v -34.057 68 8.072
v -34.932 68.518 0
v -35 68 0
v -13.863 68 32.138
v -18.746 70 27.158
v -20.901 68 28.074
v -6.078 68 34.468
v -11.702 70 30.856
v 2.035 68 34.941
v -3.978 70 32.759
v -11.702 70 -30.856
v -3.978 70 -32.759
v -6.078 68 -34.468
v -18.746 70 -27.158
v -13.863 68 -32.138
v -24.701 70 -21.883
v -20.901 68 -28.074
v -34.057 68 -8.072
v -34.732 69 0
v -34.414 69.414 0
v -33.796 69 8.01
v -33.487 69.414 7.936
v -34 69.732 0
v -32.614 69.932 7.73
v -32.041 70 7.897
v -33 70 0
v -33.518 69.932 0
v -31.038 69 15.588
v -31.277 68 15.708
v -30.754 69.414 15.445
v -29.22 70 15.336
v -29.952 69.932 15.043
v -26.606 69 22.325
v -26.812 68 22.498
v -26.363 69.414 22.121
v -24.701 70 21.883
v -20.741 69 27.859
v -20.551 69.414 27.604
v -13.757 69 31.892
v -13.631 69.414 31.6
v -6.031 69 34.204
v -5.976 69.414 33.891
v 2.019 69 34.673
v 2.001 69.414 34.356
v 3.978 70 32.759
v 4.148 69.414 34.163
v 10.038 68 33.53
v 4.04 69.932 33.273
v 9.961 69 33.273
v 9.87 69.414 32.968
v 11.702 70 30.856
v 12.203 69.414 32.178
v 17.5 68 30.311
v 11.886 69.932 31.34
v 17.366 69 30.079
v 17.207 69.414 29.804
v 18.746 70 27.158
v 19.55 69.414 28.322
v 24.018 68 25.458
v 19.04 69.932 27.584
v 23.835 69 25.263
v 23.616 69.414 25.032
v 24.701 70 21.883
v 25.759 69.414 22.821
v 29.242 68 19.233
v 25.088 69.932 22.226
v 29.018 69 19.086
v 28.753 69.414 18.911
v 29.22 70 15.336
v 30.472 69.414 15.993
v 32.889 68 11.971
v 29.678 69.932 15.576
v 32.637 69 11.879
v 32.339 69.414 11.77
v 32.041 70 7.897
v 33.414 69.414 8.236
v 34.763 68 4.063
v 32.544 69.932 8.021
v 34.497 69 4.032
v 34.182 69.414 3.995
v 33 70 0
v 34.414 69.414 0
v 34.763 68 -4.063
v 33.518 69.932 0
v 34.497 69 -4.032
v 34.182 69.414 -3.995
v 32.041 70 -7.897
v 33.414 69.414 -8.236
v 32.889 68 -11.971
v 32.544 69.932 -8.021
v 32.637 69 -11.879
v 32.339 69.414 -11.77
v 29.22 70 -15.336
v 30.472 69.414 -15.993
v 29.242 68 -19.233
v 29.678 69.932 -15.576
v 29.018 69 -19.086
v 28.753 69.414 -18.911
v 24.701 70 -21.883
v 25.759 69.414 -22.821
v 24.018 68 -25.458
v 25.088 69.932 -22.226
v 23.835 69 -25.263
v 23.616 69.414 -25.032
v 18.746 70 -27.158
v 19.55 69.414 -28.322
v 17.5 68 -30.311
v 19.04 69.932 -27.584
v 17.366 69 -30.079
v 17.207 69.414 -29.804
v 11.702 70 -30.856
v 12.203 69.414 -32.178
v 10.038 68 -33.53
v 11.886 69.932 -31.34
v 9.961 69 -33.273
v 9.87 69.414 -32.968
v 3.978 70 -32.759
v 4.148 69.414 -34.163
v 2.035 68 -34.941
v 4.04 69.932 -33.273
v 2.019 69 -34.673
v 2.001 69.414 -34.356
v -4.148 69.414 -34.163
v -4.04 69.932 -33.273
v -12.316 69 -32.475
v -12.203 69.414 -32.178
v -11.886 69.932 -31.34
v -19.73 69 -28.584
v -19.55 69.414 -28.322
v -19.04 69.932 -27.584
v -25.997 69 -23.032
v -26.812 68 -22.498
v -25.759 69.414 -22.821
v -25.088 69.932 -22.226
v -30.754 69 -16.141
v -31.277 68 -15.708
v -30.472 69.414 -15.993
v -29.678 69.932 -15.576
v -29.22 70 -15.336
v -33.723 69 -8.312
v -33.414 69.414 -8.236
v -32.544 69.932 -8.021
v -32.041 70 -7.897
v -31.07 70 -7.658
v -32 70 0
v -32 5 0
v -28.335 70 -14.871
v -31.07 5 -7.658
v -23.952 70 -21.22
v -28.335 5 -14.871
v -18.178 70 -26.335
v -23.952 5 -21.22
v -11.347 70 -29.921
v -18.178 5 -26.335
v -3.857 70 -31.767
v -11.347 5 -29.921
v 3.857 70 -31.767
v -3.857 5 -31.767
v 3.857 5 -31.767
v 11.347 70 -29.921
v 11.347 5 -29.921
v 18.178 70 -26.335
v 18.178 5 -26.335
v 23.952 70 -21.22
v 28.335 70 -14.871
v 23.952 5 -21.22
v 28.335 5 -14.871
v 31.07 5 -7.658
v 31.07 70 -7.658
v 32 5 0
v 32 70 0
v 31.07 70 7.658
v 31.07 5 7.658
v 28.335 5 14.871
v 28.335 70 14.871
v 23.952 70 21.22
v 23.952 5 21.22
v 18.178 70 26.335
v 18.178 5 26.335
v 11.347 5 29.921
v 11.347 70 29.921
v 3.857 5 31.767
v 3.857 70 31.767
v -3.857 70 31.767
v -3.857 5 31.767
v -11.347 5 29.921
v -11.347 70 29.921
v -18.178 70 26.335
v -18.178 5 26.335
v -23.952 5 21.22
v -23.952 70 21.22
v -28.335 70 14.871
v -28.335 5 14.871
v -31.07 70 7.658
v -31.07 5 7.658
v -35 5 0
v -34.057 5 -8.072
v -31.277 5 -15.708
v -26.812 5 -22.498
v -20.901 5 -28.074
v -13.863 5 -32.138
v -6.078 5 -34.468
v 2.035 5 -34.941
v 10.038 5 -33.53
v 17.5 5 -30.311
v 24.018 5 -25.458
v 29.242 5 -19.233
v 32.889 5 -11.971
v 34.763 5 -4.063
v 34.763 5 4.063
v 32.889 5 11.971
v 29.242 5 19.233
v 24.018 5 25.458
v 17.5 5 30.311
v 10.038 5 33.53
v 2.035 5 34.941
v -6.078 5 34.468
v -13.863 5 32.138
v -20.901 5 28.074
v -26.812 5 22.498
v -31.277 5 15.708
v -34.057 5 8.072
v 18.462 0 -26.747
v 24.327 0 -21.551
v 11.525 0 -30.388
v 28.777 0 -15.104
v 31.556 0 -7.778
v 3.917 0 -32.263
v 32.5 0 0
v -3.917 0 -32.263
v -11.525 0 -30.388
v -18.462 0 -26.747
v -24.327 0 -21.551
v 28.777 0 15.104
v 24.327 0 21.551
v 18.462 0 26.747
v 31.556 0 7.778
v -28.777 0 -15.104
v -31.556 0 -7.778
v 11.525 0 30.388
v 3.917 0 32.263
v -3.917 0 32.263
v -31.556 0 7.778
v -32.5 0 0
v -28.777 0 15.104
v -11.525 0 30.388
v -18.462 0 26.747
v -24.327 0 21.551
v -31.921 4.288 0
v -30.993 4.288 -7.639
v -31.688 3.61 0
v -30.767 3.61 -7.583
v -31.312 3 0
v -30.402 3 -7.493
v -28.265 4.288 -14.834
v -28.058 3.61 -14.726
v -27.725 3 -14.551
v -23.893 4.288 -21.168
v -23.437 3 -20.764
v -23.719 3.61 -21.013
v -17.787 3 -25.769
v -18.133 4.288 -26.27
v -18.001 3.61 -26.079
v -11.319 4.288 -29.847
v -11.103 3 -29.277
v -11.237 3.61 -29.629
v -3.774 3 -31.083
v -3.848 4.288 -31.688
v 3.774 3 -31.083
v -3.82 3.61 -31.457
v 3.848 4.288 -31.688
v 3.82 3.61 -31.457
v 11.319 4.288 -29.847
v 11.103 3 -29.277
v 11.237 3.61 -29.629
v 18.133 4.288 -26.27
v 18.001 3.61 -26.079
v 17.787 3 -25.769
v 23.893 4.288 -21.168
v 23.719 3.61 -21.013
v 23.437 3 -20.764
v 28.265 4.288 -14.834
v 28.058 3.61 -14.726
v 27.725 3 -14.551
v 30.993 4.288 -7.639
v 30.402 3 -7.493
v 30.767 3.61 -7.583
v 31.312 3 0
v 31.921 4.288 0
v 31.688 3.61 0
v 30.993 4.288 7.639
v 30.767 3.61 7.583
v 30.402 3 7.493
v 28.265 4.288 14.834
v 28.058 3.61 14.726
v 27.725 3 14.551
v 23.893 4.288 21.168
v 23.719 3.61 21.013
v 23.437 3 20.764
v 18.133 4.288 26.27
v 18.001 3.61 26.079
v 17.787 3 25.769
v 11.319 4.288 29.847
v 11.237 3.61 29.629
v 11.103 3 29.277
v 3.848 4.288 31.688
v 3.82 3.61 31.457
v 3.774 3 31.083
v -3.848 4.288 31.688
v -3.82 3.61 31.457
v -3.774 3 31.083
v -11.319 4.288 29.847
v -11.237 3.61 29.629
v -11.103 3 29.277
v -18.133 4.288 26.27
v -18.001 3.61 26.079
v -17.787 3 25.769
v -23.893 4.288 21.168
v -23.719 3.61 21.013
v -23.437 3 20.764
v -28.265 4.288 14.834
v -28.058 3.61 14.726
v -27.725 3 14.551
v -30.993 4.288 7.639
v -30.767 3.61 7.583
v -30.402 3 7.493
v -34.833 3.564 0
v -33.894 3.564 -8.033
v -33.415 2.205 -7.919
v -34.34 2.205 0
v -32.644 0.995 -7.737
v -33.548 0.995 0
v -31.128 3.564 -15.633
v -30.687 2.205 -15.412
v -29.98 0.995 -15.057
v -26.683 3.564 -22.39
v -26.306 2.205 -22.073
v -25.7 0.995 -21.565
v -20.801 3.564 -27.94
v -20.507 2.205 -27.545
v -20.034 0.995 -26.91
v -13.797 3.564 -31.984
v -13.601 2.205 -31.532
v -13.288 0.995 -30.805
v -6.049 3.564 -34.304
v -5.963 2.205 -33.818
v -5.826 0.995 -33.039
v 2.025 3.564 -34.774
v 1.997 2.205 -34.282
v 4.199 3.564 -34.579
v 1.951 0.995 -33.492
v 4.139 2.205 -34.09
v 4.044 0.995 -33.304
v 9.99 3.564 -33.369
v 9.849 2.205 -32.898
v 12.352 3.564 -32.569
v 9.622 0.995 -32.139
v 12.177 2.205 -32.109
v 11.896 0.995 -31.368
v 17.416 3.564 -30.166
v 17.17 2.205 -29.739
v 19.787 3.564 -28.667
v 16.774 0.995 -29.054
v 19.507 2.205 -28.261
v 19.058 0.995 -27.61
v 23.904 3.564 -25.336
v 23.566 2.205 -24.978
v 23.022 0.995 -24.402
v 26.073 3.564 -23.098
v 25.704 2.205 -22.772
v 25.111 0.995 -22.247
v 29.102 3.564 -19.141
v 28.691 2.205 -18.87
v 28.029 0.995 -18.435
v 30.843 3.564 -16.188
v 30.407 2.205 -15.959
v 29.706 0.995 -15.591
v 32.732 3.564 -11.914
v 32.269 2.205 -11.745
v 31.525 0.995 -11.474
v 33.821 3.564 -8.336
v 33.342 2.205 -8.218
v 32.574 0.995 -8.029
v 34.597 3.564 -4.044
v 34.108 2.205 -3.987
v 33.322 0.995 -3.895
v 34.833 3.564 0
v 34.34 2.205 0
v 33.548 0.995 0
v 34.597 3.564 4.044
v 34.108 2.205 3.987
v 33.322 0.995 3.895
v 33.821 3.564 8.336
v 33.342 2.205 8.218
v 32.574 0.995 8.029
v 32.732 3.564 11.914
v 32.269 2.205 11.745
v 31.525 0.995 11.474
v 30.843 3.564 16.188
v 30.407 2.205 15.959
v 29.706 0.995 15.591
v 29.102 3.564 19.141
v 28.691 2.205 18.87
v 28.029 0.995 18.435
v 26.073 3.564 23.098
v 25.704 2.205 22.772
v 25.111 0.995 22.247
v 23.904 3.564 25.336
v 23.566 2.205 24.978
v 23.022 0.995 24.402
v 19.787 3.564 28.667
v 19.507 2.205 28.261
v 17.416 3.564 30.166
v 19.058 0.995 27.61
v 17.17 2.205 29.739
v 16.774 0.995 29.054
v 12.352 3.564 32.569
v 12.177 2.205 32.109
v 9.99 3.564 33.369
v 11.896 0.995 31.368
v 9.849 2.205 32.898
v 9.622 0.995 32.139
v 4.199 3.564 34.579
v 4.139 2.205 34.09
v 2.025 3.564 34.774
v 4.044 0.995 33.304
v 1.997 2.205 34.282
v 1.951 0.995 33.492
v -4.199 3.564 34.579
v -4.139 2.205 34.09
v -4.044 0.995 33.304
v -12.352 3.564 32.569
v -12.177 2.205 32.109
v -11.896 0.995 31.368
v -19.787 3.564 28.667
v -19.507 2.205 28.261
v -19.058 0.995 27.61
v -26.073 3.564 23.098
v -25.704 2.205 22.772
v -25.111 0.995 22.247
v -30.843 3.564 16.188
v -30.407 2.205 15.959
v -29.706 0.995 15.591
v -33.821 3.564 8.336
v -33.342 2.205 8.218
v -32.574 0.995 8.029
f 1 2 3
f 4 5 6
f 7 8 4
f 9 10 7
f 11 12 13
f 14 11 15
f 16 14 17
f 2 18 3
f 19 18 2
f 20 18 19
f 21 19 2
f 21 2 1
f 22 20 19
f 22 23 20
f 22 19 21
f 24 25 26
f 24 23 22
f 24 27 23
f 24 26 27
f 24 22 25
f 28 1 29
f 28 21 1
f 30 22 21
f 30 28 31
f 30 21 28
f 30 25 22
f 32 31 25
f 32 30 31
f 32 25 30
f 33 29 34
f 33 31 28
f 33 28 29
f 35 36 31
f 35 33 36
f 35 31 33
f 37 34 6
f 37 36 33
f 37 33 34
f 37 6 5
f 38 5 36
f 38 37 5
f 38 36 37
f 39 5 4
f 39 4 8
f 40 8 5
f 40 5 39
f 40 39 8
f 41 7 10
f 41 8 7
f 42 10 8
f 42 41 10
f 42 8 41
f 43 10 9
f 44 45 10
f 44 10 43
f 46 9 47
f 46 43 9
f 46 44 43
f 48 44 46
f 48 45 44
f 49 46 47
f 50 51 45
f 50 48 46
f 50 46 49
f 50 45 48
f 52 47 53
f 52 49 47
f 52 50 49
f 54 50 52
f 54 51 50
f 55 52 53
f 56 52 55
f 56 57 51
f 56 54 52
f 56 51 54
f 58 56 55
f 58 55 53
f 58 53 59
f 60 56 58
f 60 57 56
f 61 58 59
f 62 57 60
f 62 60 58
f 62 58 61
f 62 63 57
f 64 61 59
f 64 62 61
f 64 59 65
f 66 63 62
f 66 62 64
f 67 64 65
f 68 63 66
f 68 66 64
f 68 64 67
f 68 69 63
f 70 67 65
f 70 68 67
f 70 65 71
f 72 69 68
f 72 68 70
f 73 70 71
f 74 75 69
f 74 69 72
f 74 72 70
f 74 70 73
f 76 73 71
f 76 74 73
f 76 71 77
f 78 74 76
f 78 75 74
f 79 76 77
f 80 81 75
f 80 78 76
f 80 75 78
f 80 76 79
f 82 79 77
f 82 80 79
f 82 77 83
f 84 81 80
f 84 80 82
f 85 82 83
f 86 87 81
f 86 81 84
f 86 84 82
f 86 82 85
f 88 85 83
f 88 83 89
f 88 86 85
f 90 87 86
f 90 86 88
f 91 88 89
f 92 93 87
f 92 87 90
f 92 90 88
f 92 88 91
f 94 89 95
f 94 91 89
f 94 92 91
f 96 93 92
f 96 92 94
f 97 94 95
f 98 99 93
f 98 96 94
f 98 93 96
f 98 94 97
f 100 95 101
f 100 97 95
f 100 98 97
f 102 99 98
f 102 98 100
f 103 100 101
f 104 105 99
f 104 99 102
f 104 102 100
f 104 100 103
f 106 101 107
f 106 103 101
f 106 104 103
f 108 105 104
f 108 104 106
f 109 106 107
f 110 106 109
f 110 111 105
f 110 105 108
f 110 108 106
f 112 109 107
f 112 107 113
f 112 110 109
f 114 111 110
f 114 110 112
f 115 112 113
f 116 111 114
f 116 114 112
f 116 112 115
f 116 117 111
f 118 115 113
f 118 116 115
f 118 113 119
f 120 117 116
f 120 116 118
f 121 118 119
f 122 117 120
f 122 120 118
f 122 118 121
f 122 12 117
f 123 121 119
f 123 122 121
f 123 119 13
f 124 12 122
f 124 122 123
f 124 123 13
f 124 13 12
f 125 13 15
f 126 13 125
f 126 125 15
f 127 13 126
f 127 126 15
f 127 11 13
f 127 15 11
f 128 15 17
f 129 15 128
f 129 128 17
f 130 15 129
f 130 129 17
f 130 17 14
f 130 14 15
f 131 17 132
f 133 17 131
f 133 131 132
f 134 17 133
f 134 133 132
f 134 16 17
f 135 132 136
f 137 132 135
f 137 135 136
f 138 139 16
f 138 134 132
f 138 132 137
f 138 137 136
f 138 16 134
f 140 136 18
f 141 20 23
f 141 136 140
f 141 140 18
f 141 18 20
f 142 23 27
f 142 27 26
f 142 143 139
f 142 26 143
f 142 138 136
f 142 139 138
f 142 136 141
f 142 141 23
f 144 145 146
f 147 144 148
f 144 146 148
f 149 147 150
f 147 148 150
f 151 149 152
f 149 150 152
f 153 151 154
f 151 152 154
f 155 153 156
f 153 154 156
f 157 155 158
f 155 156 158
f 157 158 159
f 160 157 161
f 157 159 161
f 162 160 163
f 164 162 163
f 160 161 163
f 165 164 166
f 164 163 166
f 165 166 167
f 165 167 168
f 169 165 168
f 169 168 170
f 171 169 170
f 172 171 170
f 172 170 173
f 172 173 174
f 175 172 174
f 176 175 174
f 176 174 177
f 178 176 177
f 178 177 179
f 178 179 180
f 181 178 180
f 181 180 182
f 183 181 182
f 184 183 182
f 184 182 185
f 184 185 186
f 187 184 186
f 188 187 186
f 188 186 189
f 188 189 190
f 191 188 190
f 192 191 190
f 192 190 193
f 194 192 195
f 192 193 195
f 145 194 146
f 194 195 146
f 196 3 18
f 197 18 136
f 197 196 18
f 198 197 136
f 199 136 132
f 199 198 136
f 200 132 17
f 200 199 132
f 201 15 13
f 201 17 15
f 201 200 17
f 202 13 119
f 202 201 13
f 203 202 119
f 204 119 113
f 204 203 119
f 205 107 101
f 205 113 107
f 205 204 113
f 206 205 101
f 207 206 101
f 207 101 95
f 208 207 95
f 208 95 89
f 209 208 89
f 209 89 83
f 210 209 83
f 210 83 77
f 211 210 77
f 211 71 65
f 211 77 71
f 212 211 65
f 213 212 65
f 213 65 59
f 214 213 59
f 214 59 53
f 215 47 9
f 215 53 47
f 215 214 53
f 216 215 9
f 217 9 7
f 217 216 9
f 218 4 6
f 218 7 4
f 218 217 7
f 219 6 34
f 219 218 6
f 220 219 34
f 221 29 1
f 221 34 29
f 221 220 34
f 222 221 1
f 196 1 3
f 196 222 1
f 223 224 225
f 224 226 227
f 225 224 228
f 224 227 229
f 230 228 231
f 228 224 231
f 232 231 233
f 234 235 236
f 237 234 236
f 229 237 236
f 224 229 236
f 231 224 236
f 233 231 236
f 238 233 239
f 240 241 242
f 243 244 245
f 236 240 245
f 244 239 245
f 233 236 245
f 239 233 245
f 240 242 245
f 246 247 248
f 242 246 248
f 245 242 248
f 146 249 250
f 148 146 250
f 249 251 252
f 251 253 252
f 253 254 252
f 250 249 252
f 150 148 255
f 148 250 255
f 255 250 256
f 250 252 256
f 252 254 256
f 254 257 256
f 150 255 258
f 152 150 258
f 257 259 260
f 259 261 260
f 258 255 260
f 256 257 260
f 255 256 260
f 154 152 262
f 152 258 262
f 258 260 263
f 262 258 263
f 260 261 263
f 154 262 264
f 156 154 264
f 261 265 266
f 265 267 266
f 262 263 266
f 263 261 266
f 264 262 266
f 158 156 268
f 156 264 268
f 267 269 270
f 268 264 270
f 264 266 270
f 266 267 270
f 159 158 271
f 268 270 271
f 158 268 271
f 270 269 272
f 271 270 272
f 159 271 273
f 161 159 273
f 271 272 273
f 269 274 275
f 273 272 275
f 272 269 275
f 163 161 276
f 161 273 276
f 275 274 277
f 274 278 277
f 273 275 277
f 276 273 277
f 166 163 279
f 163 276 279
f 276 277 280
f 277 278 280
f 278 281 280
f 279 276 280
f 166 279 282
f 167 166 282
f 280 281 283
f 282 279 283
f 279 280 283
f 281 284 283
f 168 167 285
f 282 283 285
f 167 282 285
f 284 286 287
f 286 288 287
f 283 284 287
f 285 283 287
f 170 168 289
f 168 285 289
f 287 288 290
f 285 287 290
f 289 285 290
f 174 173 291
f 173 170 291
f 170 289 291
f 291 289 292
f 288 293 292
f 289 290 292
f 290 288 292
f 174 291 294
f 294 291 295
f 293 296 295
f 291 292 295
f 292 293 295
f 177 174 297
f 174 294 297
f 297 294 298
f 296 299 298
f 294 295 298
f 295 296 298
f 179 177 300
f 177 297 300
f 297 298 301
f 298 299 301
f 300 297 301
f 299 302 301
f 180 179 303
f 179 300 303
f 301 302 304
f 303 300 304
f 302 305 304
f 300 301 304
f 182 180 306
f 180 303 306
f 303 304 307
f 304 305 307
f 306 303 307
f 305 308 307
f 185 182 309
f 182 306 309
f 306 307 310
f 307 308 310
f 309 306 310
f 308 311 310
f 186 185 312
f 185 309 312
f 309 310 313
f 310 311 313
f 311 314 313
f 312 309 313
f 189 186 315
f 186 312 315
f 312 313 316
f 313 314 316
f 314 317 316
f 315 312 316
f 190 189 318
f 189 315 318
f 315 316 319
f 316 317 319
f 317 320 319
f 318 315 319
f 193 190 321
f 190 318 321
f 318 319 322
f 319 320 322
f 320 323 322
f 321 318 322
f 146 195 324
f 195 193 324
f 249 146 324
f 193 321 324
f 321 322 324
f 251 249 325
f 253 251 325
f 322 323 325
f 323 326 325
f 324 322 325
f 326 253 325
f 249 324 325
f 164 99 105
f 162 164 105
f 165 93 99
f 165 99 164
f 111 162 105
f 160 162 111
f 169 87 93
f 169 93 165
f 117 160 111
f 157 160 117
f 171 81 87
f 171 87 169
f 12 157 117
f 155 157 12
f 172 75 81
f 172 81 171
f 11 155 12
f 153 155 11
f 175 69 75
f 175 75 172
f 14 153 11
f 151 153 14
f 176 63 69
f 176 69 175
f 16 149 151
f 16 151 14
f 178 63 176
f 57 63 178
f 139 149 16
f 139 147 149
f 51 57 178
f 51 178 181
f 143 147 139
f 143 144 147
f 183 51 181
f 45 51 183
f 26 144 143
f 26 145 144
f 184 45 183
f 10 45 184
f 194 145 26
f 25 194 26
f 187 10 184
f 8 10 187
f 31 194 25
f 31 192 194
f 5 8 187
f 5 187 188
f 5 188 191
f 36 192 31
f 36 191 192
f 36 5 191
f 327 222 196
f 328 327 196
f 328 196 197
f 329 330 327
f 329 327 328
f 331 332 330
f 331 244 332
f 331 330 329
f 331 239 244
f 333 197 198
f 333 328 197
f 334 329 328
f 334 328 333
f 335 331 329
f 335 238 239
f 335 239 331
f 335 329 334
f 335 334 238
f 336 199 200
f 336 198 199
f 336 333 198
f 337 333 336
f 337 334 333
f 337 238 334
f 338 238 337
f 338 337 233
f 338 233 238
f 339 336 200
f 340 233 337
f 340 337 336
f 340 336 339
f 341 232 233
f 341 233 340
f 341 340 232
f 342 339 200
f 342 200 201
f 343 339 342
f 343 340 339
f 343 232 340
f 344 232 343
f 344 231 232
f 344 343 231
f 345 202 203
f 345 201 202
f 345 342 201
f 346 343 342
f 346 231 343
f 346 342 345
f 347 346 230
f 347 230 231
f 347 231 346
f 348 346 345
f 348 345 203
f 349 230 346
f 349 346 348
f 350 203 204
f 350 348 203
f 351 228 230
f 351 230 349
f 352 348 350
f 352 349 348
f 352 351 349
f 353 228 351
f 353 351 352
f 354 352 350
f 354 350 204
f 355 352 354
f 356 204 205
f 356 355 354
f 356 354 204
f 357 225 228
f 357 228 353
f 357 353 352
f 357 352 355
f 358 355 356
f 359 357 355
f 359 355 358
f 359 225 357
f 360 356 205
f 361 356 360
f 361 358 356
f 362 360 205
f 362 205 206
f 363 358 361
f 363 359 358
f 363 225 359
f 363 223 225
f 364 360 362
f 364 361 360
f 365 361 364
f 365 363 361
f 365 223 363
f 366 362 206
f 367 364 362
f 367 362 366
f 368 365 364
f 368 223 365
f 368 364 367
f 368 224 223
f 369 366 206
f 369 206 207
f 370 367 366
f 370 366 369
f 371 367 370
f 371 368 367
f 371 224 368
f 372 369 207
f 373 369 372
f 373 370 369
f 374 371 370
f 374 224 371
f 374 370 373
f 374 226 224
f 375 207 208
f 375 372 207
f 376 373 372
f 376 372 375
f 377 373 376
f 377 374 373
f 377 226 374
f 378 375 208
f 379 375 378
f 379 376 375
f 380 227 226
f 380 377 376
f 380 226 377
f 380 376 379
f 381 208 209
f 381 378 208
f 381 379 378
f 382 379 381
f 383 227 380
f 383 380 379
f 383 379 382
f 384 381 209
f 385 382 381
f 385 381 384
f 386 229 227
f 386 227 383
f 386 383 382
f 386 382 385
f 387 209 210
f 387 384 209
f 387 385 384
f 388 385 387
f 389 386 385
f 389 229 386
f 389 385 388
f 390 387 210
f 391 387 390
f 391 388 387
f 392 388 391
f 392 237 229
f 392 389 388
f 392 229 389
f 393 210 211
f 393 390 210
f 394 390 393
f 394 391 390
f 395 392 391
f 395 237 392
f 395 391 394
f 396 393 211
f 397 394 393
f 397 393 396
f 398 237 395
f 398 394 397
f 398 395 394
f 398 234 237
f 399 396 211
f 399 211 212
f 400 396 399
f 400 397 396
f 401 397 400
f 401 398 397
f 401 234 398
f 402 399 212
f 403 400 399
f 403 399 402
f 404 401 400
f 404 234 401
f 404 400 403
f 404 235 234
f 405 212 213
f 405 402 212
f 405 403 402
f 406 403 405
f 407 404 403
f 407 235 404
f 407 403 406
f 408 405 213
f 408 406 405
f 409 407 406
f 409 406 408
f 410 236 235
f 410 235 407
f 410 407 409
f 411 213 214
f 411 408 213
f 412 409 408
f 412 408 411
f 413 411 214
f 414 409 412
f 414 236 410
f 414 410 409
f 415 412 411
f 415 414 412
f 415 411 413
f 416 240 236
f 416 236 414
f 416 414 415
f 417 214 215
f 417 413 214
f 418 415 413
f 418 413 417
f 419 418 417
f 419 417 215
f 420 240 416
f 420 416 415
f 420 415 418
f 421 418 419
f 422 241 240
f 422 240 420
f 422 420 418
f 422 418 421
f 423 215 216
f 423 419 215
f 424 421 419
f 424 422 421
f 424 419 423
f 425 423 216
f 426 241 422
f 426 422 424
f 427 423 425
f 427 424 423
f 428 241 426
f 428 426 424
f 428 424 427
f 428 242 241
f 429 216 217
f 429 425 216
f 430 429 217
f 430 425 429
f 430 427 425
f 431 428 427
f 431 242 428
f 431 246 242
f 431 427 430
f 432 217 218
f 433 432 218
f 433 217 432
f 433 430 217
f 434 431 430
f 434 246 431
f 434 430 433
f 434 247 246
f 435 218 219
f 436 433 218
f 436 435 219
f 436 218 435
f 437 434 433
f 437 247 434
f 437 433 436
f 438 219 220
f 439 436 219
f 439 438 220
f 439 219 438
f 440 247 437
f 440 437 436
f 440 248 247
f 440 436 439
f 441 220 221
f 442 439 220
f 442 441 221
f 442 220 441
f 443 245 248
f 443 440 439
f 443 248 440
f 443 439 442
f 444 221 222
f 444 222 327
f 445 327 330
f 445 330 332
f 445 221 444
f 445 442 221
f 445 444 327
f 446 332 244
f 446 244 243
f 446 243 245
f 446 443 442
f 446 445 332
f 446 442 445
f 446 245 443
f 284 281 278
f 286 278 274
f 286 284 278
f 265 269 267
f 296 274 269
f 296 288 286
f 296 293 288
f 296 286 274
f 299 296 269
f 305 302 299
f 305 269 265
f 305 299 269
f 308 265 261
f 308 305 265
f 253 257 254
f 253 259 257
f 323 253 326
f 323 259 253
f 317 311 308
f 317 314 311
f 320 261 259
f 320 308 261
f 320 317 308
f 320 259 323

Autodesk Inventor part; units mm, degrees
ref_plane "XZ Plane" through (0, 0, 0) normal (0, 1, 0) x (-1, 0, 0)
sketch "Boceto1" plane through (0, 0, 0) normal (0, 0, 1) x (1, 0, 0)
  line L0 (0, 0) -> (-32.5, 0)
  line L1 (0, 0) -> (0, 70)
  line L2 (0, 70) -> (-35, 70)
  line L3 (-35, 70) -> (-35, 5)
  arc A0 (-35, 5) -> (-32.5, 0) centre (-28.75, 5) ccw
  dimension "d0" = 32.5
  dimension "d1" = 70
  dimension "d2" = 35
  dimension "d3" = 65
revolve "Revolución1" add sketch "Boceto1" angle 360 about axis through (0, 0, 0) along (0, 1, 0)
shell "Vaciado1" thickness 3 removed faces 1 at (-0.2748, 70, -9.3581)
sketch "Boceto2" plane through (0, 0, 0) normal (0, 0, 1) x (1, 0, 0)
  line L0 (35, 5) -> (35, 70) projected
  line L1 (32, 5) -> (32, 70) projected
  line L2 (35, 60.0697) -> (60, 60.0697)
  arc A0 (66.5079, 49.9877) -> (60, 60.0697) centre (54.5227, 49.3927) ccw
  line L3 (66.5079, 49.9877) -> (35, 15)
  point P0 (0, 0)
  dimension "d10" = 25
  dimension "d11" = 12
  dimension "d12" = 12
ref_plane "Plano de trabajo1" through (35, 60.0697, 0) normal (1, 0, 0) x (0, 1, 0)
sketch "Boceto3" plane through (35, 60.0697, 0) normal (1, 0, 0) x (0, 1, 0)
  ellipse E0 centre (0, 0) end of major axis (-4, 0) minor radius 6
  point P0 (-60.0697, 0)
  dimension "d14" = 4
  dimension "d15" = 6
ref_plane "Plano de trabajo10" through (35, 15, 0) normal (1, 0, 0) x (0, 1, 0)
sketch "Boceto8" plane through (35, 15, 0) normal (1, 0, 0) x (0, 1, 0)
  ellipse E0 centre (0, 0) end of major axis (-3, 0) minor radius 5
  point P0 (-15, 0)
  dimension "d23" = 5
  dimension "d24" = 3
fillet "Empalme1" radius 2 1 edges at (35, 70, 0)
sketch "Boceto9" plane through (0, 0, 0) normal (0, -1, 0) x (1, 0, 0)
  circle A0 centre (0, 0) radius 32.5
  circle A1 centre (0, 0) radius 31
  dimension "d26" = 65
  dimension "d27" = 62
properties part number "Taza Juan Molina"
